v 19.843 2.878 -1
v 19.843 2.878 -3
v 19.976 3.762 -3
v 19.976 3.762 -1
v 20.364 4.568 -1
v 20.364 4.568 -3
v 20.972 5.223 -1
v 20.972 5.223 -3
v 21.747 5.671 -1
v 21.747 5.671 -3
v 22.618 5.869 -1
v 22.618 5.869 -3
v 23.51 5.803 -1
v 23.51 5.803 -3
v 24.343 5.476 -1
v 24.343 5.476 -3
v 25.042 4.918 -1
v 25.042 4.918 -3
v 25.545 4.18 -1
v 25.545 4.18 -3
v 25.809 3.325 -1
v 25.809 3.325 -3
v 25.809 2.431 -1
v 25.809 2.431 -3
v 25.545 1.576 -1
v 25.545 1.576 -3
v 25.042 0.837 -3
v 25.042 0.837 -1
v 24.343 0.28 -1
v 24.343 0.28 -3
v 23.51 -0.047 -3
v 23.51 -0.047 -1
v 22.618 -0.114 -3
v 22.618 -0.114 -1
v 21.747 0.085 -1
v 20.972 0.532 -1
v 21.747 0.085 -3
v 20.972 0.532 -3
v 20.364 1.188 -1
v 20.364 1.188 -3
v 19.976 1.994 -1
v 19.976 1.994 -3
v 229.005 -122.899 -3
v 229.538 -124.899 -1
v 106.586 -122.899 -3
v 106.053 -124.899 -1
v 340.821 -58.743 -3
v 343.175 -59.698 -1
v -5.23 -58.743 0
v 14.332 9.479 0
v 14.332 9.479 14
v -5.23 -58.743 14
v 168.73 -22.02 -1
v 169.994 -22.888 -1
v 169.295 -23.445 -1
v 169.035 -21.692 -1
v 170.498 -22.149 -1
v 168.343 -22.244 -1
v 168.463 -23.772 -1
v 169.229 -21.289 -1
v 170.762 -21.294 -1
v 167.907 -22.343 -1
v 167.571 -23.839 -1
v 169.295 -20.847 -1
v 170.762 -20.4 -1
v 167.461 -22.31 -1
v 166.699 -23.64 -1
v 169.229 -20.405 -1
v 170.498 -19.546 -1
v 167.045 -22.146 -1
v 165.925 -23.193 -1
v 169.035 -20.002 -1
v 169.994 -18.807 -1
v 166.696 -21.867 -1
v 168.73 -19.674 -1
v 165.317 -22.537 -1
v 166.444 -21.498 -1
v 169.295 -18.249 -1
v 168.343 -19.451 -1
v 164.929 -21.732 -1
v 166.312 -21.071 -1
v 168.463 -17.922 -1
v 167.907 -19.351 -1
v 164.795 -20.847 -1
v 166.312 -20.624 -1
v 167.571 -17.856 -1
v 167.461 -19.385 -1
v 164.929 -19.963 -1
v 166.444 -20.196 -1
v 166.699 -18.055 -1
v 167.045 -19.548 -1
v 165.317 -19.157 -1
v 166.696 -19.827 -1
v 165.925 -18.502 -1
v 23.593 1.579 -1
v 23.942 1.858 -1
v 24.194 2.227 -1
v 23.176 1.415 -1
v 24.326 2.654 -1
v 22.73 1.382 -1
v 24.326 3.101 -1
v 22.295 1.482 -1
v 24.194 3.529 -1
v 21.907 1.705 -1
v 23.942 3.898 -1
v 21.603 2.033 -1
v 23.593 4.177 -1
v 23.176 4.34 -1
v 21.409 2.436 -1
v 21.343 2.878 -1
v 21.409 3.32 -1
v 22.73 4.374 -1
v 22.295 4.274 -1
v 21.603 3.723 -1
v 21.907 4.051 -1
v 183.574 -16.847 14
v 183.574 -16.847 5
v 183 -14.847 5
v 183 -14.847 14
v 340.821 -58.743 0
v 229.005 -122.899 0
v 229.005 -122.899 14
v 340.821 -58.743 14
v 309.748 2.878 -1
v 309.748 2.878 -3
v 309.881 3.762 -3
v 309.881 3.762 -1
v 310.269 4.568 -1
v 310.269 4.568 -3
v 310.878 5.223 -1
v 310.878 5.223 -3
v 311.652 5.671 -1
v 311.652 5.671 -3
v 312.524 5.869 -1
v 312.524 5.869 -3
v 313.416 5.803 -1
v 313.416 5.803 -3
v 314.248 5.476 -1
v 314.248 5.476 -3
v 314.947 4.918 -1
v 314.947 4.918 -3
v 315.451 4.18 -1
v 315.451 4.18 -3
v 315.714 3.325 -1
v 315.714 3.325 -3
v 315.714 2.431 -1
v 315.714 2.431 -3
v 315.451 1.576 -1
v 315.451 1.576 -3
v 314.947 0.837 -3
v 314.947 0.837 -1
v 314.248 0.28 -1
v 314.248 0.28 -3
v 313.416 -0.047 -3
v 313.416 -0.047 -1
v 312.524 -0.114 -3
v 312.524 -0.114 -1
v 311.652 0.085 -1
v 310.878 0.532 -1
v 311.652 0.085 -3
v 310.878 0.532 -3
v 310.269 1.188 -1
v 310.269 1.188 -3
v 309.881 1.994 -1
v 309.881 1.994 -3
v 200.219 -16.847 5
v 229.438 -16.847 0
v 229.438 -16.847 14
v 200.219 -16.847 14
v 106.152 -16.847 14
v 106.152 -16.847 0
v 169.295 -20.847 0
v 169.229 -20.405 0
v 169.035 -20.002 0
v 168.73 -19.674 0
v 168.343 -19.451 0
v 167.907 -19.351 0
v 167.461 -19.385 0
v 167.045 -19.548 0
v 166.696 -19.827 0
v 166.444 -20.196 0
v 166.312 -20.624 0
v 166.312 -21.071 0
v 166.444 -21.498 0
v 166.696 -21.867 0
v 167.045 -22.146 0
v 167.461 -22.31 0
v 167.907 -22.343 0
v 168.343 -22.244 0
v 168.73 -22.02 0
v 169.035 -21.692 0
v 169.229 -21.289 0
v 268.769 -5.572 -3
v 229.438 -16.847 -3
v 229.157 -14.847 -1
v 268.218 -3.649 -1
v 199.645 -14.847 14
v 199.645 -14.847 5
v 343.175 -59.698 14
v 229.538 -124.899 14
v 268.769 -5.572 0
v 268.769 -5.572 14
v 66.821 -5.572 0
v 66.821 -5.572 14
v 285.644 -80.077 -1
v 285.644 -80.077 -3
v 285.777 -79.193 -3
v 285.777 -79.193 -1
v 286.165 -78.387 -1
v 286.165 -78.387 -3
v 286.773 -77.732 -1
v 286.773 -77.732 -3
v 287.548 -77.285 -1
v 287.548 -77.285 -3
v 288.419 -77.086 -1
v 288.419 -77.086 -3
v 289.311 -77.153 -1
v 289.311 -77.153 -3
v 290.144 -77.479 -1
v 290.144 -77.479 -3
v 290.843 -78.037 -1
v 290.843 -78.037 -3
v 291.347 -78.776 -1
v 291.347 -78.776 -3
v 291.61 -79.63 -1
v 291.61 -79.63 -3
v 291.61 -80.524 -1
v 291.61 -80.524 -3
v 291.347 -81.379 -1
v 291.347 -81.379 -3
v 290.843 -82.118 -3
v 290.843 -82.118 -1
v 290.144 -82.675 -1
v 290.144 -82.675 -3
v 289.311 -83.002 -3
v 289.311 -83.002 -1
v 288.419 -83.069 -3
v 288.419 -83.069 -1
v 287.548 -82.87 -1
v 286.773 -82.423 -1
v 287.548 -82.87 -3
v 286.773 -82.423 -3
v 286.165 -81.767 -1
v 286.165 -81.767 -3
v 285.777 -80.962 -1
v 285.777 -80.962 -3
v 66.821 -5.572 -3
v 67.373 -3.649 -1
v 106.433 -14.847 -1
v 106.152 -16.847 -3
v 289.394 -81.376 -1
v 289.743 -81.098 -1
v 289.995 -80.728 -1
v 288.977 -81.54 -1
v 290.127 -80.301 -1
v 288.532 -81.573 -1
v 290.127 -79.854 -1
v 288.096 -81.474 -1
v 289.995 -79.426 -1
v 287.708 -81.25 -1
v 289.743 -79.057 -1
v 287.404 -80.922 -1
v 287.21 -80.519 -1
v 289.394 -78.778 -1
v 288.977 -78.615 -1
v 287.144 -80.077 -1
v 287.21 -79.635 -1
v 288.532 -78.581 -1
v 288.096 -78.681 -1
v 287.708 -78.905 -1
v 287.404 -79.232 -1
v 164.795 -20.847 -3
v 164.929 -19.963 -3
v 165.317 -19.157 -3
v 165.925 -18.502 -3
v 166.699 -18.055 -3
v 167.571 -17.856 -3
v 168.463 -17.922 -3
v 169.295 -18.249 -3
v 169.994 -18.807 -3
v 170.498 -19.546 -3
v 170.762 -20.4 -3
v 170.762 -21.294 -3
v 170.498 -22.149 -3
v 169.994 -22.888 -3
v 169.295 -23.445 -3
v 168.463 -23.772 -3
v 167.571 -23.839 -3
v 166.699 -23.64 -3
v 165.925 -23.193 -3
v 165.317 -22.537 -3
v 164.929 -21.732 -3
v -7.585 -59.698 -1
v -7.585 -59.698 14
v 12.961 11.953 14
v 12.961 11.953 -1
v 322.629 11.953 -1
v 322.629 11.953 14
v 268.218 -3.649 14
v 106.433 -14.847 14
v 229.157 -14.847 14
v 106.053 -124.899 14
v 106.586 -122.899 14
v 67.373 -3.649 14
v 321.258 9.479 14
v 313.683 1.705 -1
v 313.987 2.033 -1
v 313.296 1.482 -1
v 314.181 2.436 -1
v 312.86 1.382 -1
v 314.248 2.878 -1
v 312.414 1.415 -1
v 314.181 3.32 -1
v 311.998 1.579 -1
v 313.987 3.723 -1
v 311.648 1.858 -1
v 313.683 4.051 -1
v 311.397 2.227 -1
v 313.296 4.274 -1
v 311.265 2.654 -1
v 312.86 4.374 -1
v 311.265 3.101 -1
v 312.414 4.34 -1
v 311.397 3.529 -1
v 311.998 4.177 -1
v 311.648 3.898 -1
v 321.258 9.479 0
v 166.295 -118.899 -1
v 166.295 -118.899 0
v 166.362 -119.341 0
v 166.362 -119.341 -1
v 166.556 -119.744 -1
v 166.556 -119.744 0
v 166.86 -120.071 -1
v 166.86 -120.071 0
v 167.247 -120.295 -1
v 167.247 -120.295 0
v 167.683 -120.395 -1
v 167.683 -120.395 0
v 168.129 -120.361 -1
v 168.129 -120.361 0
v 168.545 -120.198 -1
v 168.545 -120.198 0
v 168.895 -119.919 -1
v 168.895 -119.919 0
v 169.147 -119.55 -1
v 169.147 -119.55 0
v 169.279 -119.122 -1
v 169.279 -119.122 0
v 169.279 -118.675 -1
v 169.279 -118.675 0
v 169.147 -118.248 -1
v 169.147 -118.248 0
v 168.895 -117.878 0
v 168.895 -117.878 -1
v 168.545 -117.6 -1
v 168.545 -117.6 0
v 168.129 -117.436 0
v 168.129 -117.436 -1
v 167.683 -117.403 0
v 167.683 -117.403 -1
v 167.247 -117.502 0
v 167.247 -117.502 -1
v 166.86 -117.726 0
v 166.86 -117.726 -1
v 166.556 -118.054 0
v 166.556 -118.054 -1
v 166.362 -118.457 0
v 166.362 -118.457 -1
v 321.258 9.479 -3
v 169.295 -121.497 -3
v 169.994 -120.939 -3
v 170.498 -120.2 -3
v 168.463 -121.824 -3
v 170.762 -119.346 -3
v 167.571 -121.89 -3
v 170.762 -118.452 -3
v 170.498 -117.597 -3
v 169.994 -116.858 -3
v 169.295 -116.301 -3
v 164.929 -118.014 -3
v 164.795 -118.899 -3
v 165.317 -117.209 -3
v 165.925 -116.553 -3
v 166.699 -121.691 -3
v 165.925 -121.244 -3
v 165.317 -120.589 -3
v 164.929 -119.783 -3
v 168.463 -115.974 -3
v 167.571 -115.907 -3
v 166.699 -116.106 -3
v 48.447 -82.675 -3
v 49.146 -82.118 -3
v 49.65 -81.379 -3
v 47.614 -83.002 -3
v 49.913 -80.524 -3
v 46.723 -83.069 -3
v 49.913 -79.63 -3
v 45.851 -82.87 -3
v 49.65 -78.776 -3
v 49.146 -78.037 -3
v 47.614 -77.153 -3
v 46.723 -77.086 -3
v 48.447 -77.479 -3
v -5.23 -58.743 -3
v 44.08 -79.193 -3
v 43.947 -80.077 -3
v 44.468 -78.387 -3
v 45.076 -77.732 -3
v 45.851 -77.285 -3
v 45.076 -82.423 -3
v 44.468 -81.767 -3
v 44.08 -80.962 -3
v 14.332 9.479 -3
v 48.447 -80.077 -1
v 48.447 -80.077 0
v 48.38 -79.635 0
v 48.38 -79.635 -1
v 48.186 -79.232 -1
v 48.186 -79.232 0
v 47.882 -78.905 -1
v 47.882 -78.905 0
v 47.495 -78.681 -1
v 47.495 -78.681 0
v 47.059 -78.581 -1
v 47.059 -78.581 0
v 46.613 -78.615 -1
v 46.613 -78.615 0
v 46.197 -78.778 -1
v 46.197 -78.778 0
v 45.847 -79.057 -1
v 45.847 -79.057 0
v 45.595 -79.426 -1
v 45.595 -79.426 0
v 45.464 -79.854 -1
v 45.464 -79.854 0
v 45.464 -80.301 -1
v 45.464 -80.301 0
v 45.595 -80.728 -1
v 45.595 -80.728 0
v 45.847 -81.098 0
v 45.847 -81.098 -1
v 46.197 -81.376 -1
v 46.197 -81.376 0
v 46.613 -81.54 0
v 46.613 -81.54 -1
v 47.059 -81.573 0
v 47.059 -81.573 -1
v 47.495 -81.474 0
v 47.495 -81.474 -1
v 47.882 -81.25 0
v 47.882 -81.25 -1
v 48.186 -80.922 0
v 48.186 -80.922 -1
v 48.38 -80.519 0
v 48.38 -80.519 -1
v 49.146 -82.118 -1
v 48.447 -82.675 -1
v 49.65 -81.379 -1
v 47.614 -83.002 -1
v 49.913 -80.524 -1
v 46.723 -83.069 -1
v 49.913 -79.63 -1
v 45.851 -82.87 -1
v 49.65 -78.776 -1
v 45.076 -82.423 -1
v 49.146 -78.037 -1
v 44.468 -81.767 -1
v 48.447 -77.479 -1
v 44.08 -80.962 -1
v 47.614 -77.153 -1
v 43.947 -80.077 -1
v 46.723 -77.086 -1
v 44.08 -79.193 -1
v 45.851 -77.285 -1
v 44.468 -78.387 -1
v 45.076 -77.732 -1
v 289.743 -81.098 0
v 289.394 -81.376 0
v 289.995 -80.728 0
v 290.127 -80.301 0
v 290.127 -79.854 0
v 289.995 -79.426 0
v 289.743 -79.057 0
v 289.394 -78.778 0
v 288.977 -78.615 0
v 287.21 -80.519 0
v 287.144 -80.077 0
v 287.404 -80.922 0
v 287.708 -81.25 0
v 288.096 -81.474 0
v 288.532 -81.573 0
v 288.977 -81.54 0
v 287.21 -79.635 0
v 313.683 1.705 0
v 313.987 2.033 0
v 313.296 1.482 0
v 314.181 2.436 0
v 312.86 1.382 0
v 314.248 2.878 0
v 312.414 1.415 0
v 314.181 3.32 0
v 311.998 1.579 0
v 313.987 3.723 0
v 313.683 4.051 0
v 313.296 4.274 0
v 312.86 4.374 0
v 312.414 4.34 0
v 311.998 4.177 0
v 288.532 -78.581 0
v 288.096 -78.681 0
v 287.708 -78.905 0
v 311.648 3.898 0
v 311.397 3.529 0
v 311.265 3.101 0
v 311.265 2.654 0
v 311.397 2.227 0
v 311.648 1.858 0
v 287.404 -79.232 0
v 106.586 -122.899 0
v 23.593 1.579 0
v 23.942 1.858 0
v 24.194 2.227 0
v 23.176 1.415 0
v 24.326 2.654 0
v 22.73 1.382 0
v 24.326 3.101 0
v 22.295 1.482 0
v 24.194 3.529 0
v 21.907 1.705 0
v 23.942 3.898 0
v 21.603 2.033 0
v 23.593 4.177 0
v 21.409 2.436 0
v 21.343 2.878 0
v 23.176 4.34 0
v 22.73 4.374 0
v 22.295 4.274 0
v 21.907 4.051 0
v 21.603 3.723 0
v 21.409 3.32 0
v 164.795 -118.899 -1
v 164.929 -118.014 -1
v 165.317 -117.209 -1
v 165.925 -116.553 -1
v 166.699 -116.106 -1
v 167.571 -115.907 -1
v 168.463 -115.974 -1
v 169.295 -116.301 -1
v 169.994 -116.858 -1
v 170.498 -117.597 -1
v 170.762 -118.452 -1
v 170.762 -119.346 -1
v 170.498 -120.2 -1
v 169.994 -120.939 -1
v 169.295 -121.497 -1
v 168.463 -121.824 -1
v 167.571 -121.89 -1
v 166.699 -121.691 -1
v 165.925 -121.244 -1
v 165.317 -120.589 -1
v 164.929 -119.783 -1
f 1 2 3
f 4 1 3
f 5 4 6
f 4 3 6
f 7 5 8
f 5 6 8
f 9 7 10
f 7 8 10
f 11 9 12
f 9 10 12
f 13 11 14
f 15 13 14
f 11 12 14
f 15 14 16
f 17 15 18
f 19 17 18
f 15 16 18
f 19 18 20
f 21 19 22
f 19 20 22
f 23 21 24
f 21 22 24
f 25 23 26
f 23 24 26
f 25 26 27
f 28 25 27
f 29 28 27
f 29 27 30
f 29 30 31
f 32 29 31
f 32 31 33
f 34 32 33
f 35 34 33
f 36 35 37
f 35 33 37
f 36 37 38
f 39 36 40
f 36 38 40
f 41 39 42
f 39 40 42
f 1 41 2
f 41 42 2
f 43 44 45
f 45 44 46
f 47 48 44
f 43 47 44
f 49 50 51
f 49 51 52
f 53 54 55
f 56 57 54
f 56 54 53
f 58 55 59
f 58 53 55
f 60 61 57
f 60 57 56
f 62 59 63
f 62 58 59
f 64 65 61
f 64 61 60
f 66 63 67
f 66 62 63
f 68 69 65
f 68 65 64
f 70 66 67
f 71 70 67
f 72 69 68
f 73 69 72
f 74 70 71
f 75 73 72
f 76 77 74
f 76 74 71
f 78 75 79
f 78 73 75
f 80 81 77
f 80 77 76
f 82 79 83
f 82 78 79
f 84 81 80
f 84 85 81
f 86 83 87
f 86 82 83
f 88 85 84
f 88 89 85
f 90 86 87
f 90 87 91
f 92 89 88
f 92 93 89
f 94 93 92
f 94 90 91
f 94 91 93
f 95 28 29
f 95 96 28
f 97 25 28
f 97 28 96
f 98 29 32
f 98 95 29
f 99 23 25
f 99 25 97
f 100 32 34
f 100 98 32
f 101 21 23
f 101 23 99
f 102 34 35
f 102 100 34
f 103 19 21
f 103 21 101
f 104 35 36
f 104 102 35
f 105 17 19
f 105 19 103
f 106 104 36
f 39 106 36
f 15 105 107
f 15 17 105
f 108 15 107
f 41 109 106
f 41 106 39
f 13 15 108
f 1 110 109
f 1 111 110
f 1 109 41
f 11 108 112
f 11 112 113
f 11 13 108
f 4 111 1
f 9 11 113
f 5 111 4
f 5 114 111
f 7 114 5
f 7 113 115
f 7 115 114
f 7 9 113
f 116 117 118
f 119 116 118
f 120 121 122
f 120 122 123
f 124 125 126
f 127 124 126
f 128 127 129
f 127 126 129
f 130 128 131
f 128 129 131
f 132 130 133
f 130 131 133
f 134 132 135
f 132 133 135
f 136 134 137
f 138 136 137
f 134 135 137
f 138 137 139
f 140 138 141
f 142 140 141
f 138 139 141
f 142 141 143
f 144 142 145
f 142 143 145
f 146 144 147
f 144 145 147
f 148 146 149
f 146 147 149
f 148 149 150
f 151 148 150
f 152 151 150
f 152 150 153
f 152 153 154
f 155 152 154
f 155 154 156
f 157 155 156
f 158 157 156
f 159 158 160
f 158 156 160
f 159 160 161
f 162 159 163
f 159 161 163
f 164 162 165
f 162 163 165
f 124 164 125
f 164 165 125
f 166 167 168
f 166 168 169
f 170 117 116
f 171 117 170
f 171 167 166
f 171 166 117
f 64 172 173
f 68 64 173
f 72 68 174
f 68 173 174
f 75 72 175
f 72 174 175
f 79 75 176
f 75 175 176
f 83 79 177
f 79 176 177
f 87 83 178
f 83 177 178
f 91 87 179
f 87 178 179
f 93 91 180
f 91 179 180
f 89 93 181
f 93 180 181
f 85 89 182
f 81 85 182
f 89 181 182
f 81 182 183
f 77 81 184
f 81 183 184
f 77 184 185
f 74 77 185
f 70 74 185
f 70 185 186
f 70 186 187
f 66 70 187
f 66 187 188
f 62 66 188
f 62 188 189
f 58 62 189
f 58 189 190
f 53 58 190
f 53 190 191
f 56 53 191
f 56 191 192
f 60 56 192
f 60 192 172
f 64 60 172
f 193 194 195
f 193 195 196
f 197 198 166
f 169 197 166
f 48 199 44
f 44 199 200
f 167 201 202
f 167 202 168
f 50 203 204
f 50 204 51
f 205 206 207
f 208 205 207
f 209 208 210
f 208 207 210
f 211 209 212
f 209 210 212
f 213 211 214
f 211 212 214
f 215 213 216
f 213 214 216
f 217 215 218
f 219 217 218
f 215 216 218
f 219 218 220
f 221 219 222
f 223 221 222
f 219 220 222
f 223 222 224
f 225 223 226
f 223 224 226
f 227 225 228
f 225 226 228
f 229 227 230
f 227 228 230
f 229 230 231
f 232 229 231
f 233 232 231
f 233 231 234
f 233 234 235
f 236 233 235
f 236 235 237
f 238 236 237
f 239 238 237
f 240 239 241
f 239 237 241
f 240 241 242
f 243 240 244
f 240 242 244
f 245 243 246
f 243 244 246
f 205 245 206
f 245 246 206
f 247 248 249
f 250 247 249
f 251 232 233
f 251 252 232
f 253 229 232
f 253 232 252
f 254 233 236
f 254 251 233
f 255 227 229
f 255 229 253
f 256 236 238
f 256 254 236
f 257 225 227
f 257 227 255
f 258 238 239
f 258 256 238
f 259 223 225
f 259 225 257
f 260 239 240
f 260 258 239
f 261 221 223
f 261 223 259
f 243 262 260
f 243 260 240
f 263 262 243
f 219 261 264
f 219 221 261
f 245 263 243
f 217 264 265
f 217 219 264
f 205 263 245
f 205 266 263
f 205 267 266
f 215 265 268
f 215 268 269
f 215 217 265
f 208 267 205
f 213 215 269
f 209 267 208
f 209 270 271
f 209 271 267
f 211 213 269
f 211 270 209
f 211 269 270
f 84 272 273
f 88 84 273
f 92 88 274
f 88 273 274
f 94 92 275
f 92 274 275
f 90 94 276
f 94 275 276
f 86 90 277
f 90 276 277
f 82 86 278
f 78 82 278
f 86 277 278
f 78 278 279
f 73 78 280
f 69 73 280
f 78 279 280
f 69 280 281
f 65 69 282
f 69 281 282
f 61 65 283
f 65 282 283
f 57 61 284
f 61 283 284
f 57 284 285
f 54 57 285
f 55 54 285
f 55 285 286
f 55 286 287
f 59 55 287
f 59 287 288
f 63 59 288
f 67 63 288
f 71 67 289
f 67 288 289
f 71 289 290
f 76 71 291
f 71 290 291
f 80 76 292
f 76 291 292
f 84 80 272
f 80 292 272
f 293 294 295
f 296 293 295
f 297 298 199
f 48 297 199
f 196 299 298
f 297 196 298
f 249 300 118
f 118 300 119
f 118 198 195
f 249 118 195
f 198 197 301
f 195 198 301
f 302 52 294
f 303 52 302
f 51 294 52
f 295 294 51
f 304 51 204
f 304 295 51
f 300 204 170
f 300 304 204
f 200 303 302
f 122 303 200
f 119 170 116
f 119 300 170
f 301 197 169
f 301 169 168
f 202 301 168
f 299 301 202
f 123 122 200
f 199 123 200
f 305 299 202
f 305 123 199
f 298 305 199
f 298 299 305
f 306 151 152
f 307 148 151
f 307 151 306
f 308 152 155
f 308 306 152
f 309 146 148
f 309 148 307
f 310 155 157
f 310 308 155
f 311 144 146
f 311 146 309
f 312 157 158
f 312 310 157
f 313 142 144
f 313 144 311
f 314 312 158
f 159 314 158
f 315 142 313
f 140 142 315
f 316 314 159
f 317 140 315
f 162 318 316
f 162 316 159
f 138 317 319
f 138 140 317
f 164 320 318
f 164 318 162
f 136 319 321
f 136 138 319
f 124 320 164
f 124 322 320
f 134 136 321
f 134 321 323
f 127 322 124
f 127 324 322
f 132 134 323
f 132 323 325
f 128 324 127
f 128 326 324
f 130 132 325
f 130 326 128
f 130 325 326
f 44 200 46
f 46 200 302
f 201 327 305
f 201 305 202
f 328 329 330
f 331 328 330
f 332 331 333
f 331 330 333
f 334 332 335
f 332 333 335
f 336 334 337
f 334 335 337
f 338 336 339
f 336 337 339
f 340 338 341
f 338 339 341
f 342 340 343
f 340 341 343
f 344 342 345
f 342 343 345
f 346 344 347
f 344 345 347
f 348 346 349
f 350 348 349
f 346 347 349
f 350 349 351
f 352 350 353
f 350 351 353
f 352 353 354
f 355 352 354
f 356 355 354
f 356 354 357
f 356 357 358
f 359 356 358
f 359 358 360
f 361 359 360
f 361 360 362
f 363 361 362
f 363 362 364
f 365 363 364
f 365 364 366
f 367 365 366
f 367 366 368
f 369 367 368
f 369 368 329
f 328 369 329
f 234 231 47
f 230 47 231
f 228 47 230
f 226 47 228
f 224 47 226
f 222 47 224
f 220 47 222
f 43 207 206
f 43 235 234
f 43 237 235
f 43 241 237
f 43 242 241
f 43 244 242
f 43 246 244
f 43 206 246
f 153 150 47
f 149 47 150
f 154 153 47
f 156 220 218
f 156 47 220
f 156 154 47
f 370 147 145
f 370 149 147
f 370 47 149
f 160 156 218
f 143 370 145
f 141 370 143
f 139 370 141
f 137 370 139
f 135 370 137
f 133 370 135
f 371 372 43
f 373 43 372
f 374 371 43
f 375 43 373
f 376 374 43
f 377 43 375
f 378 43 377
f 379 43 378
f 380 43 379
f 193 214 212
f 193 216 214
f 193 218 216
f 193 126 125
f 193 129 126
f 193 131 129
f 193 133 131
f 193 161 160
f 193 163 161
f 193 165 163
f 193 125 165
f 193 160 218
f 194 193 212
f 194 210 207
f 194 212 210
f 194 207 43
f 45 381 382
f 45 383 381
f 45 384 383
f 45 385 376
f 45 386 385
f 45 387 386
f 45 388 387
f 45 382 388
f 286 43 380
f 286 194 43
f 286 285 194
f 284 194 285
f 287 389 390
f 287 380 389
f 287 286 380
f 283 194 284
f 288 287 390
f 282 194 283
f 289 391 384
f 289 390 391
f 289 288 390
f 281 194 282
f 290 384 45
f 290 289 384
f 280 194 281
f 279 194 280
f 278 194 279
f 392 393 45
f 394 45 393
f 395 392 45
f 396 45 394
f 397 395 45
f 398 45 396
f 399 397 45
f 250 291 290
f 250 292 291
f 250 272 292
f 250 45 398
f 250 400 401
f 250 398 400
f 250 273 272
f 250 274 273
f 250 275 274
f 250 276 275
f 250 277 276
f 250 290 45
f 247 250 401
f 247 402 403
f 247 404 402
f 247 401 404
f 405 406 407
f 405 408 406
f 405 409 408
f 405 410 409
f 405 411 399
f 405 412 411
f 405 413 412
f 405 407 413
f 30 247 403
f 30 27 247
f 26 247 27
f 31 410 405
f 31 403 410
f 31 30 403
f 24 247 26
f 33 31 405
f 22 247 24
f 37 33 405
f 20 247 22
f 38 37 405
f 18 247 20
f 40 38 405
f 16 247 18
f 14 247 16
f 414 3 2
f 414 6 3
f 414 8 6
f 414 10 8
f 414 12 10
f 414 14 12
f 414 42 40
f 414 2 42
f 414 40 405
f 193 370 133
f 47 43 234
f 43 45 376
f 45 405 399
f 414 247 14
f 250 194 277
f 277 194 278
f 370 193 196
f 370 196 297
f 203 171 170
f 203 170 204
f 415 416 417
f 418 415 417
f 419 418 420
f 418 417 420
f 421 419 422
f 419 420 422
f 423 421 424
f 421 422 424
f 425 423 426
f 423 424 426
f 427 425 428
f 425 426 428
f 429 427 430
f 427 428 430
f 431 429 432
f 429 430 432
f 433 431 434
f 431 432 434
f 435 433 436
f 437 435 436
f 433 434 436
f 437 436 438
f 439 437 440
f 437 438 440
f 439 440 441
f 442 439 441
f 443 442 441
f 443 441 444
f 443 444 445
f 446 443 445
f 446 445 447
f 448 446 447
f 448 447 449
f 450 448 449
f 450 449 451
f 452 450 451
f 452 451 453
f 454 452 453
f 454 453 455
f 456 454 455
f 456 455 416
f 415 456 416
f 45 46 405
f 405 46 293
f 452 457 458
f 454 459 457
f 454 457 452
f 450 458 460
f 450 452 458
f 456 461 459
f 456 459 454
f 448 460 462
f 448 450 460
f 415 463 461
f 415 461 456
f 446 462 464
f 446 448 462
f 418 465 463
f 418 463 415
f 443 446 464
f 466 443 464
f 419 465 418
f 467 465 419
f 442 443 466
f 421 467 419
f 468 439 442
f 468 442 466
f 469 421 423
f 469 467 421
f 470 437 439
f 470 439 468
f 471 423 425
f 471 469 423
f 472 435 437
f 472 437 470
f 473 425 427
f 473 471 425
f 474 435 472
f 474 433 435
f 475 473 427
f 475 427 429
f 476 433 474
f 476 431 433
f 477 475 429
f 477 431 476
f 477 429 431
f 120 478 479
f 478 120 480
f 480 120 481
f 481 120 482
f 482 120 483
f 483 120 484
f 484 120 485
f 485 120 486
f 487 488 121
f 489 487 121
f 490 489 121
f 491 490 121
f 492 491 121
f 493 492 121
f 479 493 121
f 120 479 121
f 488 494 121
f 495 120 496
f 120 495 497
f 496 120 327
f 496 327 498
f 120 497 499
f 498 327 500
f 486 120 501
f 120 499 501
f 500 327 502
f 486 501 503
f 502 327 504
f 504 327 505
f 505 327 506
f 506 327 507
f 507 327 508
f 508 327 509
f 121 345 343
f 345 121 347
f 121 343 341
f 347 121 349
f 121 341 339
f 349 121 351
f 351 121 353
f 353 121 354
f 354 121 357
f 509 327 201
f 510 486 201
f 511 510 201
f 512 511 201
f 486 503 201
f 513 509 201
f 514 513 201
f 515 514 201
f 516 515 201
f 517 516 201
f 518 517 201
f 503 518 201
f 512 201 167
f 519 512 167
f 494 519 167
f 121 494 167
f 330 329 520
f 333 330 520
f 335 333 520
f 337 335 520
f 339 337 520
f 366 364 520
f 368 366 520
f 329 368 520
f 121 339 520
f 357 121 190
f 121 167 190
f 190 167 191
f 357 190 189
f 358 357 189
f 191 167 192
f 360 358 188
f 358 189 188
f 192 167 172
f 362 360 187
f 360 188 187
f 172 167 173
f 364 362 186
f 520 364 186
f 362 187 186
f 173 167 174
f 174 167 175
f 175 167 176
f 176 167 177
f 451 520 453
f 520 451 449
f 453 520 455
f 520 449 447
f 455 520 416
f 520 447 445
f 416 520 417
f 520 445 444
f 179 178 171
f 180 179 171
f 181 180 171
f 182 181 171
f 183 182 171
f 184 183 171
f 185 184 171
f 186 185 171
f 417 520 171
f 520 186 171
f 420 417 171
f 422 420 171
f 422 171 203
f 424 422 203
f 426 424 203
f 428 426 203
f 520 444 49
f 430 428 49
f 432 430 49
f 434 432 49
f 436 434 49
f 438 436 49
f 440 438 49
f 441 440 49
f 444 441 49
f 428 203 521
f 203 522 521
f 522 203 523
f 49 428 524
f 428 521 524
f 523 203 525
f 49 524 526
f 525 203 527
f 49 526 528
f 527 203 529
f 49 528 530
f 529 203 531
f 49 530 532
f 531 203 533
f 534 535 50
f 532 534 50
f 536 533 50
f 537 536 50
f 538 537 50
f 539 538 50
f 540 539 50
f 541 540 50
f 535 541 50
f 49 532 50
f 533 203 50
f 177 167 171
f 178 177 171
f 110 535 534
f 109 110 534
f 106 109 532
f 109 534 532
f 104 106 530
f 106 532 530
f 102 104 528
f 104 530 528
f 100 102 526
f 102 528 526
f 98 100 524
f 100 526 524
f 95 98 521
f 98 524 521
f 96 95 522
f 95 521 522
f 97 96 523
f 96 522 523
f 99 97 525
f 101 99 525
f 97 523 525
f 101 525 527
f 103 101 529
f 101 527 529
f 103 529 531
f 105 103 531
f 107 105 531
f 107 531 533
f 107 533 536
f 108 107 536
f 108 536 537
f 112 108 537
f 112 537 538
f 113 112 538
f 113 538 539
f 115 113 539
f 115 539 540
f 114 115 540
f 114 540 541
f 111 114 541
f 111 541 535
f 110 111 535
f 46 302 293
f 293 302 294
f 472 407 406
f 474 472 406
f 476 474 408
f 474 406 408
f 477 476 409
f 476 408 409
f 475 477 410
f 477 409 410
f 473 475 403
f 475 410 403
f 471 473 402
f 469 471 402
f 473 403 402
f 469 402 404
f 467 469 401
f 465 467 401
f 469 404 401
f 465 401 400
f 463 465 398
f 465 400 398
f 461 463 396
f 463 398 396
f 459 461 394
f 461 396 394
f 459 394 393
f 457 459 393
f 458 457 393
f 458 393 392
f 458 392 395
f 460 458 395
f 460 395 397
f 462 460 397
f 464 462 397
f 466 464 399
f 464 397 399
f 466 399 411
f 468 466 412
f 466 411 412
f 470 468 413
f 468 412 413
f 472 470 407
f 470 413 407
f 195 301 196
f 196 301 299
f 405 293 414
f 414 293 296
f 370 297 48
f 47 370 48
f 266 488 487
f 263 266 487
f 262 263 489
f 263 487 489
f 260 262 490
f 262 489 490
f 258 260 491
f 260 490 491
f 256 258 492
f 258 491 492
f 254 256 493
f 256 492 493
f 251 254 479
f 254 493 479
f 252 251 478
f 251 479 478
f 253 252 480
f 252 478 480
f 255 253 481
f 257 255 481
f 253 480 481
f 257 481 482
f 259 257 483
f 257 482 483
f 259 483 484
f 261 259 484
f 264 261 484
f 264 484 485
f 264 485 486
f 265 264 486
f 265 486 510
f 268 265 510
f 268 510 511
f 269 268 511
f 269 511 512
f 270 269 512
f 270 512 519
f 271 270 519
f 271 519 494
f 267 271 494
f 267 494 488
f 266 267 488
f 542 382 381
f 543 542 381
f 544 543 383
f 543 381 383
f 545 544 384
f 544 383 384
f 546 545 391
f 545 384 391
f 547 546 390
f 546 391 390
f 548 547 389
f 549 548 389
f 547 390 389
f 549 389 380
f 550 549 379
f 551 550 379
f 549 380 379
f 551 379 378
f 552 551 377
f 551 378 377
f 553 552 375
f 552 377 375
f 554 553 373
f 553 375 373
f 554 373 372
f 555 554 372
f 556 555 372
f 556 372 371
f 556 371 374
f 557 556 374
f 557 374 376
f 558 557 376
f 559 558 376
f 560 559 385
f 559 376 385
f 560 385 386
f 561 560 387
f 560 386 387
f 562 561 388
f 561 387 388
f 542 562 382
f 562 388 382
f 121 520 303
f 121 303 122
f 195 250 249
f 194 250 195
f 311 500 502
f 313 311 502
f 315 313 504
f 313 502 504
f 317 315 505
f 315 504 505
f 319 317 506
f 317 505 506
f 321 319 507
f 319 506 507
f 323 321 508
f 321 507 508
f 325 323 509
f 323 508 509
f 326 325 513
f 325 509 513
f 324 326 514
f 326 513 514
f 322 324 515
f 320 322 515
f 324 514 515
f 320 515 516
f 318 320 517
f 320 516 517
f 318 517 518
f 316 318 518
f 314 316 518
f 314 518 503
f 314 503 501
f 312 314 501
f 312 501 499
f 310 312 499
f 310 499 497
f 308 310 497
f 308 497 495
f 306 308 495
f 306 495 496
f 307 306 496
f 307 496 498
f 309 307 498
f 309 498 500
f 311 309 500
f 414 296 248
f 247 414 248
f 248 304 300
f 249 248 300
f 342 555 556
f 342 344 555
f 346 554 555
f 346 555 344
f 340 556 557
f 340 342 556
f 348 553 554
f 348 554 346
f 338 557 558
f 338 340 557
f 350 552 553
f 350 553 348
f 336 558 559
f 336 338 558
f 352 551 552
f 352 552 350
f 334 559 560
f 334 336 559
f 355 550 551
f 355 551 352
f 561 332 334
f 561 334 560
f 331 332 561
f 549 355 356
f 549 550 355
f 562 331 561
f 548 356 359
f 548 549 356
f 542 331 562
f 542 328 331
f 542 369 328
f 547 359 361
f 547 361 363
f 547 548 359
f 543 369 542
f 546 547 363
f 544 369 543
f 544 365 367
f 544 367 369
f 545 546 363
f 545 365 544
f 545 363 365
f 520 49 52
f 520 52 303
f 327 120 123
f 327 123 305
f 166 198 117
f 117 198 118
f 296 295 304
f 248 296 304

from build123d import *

# Parameters (mm, degrees)
BOSS_EXTRU_1_DEPTH      = 14
BOSS_EXTRU_2_DEPTH      = 3
ENL_V_START             = 5
ENL_V_MAT_EXTRU_1_DEPTH = 10
ESQUISSE7_R             = 1.5
ENL_V_MAT_EXTRU_2_DEPTH = 10
ESQUISSE8_R             = 3
ENL_V_MAT_EXTRU_3_DEPTH = 2
CHANFREIN1_SIZE         = 2


with BuildPart() as part:
    # Esquisse1 → Boss.-Extru.1 (new body)
    with BuildSketch(Plane.XY):
        Polygon((229.15721289, -14.84723942), (106.433306853, -14.84723942), (67.372523259, -3.649091023), (12.961214213, 11.953100779), (-7.58450021, -59.698320459), (106.05278448, -124.898736851), (229.537735263, -124.898736851), (343.175019953, -59.698320459), (322.62930553, 11.953100779), (268.217996484, -3.649091023), align=None)
        Polygon((229.438237844, -16.84723942), (106.152281899, -16.84723942), (66.821302011, -5.571629745), (14.332462893, 9.479302675), (-5.230075099, -58.743374877), (106.585792597, -122.898736851), (229.004727146, -122.898736851), (340.820594842, -58.743374877), (321.25805685, 9.479302675), (268.769217732, -5.571629745), align=None, mode=Mode.SUBTRACT)
    extrude(amount=BOSS_EXTRU_1_DEPTH)

    # Esquisse2 → Boss.-Extru.2 (add)
    with BuildSketch(Plane(origin=(0, 0, 0), x_dir=(-1, 0, 0), z_dir=(0, 0, -1))):
        Polygon((-229.15721289, -14.84723942), (-268.217996484, -3.649091023), (-322.62930553, 11.953100779), (-343.175019953, -59.698320459), (-229.537735263, -124.898736851), (-106.05278448, -124.898736851), (7.58450021, -59.698320459), (-12.961214213, 11.953100779), (-67.372523259, -3.649091023), (-106.433306853, -14.84723942), align=None)
    extrude(amount=BOSS_EXTRU_2_DEPTH)

    # Esquisse3 → Enlèv. mat.-Extru.1 (cut)
    with BuildSketch(Plane.XY.offset(ENL_V_START)):
        Polygon((193.384025698, 6.988548589), (218.304917235, -79.922959834), (202.924702789, -84.333062282), (178.003811253, 2.578446141), align=None)
    extrude(amount=ENL_V_MAT_EXTRU_1_DEPTH, mode=Mode.SUBTRACT)

    # Esquisse7 → Enlèv. mat.-Extru.2 (cut)
    with BuildSketch(Plane.XY):
        with Locations((312.747989314, 2.877882334)):
            Circle(ESQUISSE7_R)
        with Locations((167.795259872, -20.84723942)):
            Circle(ESQUISSE7_R)
        with Locations(Location((22.842530429, 2.877882334, 0), (0, 0, 180))):
            Circle(ESQUISSE7_R)
        with Locations(Location((167.795259872, -118.898736851, 0), (0, 0, 180))):
            Circle(ESQUISSE7_R)
        with Locations((46.946880967, -80.077290604)):
            Circle(ESQUISSE7_R)
        with Locations(Location((288.643638776, -80.077290604, 0), (0, 0, 180))):
            Circle(ESQUISSE7_R)
    extrude(amount=-ENL_V_MAT_EXTRU_2_DEPTH, mode=Mode.SUBTRACT)

    # Esquisse8 → Enlèv. mat.-Extru.3 (cut)
    with BuildSketch(Plane(origin=(0, 0, -3), x_dir=(-1, 0, 0), z_dir=(0, 0, -1))):
        with Locations((-22.842530429, 2.877882334)):
            Circle(ESQUISSE8_R)
        with Locations((-46.946880967, -80.077290604)):
            Circle(ESQUISSE8_R)
        with Locations((-167.795259872, -118.898736851)):
            Circle(ESQUISSE8_R)
        with Locations((-167.795259872, -20.84723942)):
            Circle(ESQUISSE8_R)
        with Locations((-288.643638776, -80.077290604)):
            Circle(ESQUISSE8_R)
        with Locations((-312.747989314, 2.877882334)):
            Circle(ESQUISSE8_R)
    extrude(amount=-ENL_V_MAT_EXTRU_3_DEPTH, mode=Mode.SUBTRACT)

    # Chanfrein1
    chanfrein1_edges = [part.edges().sort_by_distance(p)[0] for p in [
        (167.795259872, -14.84723942, -3),
        (248.687604687, -9.248165222, -3),
        (295.423651007, 4.152004878, -3),
        (332.902162742, -23.87260984, -3),
        (286.356377608, -92.298528655, -3),
        (167.795259872, -124.898736851, -3),
        (49.234142135, -92.298528655, -3),
        (2.688357001, -23.87260984, -3),
        (40.166868736, 4.152004878, -3),
        (86.902915056, -9.248165222, -3),
    ]]
    chamfer(chanfrein1_edges, length=CHANFREIN1_SIZE)


solid = part.part
